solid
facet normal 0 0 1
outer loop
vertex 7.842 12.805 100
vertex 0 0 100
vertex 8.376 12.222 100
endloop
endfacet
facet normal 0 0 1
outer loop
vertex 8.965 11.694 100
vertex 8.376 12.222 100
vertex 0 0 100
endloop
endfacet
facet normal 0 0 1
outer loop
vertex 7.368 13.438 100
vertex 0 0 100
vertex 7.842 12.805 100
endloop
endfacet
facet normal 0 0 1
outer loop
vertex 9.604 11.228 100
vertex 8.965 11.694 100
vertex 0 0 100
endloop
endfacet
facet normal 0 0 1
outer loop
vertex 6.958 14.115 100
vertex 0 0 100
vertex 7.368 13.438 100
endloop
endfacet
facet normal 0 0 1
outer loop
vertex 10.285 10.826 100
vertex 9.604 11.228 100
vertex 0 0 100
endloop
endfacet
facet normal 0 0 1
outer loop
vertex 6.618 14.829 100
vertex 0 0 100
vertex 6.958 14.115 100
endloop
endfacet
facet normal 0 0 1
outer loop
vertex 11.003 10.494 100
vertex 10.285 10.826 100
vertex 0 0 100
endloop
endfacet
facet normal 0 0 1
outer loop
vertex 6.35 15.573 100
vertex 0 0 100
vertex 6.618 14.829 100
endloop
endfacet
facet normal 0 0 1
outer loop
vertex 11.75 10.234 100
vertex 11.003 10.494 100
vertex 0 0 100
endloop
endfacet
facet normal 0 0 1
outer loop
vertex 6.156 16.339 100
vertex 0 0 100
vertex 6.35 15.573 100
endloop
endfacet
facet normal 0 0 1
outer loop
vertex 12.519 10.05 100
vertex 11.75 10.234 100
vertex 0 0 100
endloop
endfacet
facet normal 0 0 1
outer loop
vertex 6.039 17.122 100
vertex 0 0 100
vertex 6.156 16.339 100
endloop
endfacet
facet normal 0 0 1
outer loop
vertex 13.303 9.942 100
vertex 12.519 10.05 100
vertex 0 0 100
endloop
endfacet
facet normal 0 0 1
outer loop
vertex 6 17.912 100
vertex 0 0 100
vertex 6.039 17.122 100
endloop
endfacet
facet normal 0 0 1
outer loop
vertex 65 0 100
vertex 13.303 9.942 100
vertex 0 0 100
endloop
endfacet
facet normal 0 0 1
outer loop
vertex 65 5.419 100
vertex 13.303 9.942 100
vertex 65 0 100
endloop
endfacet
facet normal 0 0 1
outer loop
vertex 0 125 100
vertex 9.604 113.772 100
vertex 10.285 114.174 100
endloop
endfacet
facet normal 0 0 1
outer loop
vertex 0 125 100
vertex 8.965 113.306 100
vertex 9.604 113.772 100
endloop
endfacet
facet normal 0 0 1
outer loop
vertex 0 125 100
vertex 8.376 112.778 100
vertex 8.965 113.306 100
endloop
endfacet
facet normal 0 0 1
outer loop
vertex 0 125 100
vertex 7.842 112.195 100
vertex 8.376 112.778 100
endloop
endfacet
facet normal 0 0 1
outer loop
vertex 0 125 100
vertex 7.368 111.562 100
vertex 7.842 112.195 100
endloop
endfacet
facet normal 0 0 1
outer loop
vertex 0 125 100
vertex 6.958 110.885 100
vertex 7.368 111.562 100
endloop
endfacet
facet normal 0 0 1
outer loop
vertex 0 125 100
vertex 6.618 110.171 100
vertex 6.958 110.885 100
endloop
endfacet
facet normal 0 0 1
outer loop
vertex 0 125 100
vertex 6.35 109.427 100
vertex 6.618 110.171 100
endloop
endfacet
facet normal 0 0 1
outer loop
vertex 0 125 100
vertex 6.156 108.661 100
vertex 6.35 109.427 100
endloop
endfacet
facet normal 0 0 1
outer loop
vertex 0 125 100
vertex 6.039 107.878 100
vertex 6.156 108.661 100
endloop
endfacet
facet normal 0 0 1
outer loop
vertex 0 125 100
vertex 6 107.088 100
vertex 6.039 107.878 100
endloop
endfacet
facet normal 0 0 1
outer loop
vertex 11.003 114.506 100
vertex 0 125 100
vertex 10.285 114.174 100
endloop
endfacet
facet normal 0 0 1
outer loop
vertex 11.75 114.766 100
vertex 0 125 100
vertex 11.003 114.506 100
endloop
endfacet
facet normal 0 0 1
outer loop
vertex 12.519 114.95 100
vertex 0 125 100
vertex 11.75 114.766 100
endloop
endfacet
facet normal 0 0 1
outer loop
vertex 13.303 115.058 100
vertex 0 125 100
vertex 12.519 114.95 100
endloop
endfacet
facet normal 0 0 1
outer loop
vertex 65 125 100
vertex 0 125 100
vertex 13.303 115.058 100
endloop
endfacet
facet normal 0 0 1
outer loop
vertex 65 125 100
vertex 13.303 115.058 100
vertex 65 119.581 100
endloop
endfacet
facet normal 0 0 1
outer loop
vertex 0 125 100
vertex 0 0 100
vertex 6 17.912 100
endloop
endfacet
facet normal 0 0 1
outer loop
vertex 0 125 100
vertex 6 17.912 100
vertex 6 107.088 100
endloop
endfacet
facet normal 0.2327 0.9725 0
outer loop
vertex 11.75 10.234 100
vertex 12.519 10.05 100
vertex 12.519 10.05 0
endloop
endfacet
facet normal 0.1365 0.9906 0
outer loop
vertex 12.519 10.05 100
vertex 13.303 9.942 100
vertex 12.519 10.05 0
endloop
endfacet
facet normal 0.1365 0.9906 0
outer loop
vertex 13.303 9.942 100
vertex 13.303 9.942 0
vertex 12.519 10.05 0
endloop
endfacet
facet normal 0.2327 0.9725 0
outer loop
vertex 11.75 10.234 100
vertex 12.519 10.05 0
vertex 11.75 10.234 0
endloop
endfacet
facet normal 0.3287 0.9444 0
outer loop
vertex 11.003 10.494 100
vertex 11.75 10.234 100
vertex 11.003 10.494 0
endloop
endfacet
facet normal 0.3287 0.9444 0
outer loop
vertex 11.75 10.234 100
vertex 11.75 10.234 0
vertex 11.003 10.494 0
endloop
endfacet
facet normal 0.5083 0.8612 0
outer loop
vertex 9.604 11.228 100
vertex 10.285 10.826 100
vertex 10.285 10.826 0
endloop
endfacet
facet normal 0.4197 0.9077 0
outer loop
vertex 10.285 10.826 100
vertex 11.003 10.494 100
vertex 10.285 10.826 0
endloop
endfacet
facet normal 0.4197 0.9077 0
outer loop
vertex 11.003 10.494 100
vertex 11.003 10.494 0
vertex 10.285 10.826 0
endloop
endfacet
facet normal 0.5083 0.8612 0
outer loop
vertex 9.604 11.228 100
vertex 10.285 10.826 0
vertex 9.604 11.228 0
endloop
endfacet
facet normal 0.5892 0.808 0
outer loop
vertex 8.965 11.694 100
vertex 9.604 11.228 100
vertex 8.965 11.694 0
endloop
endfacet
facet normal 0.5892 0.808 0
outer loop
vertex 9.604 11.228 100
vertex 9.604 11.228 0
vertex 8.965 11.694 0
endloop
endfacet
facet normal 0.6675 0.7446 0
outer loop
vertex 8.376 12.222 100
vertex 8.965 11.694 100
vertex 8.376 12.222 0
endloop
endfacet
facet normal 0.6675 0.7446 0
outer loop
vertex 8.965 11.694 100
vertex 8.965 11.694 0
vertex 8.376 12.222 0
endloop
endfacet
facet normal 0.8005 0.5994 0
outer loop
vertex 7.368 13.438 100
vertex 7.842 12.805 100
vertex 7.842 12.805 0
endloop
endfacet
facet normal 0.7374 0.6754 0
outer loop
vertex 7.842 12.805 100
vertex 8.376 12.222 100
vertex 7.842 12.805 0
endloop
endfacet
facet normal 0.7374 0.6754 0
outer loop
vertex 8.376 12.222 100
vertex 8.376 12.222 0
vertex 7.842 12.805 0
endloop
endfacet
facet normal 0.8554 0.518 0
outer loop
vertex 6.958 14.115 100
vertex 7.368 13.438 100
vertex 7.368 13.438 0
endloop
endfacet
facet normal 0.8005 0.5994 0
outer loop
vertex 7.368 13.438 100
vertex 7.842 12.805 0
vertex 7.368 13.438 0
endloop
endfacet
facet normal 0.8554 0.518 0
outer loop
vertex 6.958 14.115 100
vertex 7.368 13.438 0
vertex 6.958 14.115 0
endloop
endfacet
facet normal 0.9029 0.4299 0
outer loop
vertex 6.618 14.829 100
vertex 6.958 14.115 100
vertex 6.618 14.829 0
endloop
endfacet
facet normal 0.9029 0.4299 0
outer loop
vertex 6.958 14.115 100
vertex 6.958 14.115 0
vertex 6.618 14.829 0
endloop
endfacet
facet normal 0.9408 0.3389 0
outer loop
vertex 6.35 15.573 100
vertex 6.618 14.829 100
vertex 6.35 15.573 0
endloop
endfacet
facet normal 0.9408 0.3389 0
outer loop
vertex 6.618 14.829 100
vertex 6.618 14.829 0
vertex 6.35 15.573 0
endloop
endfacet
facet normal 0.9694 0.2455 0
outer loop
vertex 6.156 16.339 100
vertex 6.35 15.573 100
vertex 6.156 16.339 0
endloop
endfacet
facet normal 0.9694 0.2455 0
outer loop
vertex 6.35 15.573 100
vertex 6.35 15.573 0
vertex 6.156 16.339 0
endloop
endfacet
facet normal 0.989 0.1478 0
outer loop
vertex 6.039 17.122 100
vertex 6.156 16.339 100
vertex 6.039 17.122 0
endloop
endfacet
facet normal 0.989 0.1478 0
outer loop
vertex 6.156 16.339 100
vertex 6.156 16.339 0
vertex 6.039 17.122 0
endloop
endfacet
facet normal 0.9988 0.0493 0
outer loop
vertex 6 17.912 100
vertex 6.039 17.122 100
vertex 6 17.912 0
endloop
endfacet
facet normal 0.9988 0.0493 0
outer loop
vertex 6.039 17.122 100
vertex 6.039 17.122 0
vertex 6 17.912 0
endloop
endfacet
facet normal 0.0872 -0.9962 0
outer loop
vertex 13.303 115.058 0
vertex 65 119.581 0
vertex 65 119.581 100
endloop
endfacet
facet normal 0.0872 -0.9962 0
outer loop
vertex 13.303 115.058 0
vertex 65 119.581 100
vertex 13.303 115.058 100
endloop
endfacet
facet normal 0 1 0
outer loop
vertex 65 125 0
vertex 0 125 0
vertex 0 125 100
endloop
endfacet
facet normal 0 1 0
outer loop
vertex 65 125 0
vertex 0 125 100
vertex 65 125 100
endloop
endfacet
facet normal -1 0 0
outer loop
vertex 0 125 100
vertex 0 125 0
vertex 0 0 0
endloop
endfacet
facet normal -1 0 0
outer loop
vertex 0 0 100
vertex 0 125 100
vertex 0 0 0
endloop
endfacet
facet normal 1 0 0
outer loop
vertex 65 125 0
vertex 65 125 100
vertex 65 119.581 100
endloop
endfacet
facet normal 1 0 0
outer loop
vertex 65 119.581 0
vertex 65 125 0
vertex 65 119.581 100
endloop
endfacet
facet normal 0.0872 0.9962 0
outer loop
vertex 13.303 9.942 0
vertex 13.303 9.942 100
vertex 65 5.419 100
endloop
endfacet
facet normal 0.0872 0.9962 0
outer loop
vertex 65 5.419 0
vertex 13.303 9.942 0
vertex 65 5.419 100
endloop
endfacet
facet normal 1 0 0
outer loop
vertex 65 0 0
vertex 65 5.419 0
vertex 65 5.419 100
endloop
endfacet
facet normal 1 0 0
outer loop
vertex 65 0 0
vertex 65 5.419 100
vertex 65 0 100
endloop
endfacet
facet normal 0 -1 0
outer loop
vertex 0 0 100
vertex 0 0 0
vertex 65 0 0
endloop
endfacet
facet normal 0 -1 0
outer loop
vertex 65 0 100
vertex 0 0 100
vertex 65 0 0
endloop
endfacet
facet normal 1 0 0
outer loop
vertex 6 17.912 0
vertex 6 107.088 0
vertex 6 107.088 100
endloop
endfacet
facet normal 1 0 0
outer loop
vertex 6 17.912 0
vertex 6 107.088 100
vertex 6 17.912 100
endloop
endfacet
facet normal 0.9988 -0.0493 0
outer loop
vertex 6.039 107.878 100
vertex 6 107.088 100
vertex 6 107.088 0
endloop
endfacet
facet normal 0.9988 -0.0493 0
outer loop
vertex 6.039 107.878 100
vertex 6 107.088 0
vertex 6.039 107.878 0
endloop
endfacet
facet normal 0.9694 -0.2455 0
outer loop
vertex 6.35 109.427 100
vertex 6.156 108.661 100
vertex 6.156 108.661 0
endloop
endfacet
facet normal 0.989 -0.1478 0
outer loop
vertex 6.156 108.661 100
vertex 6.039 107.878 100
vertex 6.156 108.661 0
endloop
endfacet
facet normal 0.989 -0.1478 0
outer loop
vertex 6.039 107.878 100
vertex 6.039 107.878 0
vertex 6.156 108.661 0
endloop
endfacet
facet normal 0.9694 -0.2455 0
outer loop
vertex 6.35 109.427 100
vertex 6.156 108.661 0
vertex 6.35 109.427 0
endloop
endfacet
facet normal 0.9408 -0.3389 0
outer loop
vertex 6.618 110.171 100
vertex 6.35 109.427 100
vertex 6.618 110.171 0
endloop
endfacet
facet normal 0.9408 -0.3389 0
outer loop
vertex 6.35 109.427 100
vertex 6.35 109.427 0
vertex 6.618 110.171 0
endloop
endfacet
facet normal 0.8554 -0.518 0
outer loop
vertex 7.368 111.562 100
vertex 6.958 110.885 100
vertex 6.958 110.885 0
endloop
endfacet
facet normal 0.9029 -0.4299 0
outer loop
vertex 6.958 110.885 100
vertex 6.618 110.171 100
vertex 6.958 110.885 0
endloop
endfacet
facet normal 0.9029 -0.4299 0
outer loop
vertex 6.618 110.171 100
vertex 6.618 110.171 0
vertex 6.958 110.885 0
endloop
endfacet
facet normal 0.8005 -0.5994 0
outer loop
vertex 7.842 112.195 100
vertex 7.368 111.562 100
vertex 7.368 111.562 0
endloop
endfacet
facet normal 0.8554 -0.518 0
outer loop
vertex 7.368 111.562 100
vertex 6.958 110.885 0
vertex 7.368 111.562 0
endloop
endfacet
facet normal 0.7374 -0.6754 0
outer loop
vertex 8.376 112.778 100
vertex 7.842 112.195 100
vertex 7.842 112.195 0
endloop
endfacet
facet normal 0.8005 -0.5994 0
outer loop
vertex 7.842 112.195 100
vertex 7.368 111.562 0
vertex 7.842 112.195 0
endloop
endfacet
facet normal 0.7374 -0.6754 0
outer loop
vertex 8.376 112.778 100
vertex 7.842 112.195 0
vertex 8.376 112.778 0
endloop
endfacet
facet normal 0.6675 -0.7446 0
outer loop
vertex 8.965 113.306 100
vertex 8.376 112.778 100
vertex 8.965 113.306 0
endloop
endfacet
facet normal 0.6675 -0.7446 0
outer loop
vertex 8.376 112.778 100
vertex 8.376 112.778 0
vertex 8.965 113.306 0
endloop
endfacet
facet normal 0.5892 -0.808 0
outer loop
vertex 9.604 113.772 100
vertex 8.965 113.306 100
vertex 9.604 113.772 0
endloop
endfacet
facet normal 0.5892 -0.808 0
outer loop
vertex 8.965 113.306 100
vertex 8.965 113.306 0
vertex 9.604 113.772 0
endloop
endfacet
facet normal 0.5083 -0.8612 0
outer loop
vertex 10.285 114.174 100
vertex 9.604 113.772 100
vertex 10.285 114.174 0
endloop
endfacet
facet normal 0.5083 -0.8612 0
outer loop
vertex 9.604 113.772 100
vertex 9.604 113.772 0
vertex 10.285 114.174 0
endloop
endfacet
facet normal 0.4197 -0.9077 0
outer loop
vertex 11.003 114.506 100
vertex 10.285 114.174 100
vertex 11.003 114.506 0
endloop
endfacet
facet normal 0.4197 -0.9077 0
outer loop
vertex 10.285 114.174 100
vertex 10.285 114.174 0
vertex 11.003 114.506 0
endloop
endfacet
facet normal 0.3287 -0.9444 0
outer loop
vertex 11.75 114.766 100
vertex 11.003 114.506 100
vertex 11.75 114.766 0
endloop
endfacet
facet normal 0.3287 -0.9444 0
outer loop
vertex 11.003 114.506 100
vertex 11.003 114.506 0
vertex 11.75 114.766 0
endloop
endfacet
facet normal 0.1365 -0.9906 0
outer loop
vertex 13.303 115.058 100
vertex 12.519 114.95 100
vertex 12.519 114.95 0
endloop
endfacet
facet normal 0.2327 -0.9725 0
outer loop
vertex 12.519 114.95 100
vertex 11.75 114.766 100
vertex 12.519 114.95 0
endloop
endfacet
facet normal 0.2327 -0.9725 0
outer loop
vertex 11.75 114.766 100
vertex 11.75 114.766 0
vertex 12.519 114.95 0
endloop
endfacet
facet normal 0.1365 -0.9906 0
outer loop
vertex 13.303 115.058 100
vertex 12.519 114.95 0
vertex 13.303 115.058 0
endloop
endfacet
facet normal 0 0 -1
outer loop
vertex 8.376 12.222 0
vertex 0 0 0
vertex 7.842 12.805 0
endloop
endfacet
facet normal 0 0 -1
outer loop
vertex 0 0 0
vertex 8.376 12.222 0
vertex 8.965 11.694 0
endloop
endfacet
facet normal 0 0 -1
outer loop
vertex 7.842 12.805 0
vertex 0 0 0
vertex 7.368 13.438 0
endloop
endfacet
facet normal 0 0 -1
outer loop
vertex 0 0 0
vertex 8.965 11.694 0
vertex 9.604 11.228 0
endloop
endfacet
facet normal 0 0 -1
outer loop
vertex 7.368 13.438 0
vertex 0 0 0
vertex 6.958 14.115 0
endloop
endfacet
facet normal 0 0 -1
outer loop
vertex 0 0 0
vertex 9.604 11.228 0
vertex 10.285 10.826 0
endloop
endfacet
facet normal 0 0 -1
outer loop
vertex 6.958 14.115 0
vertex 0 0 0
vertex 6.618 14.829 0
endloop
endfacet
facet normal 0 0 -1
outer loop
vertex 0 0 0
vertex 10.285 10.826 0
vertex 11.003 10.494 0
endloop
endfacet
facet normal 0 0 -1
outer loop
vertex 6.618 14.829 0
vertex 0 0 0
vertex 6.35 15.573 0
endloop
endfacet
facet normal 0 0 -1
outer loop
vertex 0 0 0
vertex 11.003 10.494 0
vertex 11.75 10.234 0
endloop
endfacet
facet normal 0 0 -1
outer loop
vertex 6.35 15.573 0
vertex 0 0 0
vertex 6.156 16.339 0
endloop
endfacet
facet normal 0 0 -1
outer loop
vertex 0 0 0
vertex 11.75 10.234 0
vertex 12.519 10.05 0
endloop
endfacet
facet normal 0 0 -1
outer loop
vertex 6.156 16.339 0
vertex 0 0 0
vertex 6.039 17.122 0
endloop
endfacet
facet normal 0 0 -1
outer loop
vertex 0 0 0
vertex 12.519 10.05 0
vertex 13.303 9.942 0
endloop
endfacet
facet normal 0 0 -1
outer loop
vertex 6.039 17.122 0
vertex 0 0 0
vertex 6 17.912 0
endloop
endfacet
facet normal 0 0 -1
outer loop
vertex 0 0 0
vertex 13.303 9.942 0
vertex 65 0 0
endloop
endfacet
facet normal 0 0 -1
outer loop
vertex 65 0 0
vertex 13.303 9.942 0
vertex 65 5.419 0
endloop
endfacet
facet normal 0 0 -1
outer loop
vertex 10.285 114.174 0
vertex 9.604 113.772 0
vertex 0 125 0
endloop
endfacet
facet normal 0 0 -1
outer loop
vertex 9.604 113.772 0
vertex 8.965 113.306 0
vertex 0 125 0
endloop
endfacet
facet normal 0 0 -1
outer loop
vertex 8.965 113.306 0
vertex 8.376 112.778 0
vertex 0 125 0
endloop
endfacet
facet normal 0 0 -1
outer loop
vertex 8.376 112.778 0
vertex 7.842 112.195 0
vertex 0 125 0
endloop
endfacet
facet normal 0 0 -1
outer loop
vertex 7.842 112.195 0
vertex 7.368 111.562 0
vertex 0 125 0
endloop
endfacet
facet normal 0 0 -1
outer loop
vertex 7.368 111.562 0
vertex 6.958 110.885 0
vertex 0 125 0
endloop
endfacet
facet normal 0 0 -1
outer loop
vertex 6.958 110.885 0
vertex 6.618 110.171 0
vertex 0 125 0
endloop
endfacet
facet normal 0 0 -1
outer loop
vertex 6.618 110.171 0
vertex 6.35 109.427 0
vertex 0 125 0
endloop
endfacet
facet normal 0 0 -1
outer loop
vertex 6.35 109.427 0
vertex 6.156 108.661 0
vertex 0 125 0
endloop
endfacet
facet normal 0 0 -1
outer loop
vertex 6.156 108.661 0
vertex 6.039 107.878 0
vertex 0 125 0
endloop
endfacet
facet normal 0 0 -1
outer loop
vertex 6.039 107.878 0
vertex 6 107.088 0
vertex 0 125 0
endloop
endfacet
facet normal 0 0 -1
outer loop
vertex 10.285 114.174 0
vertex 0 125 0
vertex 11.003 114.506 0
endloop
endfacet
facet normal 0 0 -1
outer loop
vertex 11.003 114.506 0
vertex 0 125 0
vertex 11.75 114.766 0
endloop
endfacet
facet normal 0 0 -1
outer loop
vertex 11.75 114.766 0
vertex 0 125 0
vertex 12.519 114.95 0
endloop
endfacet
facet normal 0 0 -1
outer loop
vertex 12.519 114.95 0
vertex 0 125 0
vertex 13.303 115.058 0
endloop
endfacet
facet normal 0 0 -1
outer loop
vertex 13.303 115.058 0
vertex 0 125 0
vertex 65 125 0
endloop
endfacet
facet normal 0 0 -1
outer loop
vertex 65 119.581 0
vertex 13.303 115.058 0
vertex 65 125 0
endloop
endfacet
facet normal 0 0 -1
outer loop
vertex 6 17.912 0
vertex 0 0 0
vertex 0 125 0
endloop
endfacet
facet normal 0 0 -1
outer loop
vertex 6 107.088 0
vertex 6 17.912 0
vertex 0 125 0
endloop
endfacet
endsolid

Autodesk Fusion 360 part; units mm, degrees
sketch "スケッチ1" plane through (0, 0, 0) normal (0, 0, 1) x (1, 0, 0)
  line L0 (13.3028, 9.942) -> (65, 5.4191)
  line L1 (0, 125) -> (0, 0)
  line L2 (0, 0) -> (65, 0)
  line L3 (65, 5.4191) -> (65, 0)
  line L4 (6, 107.0884) -> (6, 17.9116)
  arc A0 (6, 17.9116) -> (13.3028, 9.942) centre (14, 17.9116) ccw
  line L5 (65, 119.5809) -> (13.3028, 115.058)
  line L6 (0, 125) -> (65, 125)
  arc A1 (13.3028, 115.058) -> (6, 107.0884) centre (14, 107.0884) ccw
  line L7 (65, 125) -> (65, 119.5809)
extrude "押し出し1" add sketch "スケッチ1" along normal blind 100
